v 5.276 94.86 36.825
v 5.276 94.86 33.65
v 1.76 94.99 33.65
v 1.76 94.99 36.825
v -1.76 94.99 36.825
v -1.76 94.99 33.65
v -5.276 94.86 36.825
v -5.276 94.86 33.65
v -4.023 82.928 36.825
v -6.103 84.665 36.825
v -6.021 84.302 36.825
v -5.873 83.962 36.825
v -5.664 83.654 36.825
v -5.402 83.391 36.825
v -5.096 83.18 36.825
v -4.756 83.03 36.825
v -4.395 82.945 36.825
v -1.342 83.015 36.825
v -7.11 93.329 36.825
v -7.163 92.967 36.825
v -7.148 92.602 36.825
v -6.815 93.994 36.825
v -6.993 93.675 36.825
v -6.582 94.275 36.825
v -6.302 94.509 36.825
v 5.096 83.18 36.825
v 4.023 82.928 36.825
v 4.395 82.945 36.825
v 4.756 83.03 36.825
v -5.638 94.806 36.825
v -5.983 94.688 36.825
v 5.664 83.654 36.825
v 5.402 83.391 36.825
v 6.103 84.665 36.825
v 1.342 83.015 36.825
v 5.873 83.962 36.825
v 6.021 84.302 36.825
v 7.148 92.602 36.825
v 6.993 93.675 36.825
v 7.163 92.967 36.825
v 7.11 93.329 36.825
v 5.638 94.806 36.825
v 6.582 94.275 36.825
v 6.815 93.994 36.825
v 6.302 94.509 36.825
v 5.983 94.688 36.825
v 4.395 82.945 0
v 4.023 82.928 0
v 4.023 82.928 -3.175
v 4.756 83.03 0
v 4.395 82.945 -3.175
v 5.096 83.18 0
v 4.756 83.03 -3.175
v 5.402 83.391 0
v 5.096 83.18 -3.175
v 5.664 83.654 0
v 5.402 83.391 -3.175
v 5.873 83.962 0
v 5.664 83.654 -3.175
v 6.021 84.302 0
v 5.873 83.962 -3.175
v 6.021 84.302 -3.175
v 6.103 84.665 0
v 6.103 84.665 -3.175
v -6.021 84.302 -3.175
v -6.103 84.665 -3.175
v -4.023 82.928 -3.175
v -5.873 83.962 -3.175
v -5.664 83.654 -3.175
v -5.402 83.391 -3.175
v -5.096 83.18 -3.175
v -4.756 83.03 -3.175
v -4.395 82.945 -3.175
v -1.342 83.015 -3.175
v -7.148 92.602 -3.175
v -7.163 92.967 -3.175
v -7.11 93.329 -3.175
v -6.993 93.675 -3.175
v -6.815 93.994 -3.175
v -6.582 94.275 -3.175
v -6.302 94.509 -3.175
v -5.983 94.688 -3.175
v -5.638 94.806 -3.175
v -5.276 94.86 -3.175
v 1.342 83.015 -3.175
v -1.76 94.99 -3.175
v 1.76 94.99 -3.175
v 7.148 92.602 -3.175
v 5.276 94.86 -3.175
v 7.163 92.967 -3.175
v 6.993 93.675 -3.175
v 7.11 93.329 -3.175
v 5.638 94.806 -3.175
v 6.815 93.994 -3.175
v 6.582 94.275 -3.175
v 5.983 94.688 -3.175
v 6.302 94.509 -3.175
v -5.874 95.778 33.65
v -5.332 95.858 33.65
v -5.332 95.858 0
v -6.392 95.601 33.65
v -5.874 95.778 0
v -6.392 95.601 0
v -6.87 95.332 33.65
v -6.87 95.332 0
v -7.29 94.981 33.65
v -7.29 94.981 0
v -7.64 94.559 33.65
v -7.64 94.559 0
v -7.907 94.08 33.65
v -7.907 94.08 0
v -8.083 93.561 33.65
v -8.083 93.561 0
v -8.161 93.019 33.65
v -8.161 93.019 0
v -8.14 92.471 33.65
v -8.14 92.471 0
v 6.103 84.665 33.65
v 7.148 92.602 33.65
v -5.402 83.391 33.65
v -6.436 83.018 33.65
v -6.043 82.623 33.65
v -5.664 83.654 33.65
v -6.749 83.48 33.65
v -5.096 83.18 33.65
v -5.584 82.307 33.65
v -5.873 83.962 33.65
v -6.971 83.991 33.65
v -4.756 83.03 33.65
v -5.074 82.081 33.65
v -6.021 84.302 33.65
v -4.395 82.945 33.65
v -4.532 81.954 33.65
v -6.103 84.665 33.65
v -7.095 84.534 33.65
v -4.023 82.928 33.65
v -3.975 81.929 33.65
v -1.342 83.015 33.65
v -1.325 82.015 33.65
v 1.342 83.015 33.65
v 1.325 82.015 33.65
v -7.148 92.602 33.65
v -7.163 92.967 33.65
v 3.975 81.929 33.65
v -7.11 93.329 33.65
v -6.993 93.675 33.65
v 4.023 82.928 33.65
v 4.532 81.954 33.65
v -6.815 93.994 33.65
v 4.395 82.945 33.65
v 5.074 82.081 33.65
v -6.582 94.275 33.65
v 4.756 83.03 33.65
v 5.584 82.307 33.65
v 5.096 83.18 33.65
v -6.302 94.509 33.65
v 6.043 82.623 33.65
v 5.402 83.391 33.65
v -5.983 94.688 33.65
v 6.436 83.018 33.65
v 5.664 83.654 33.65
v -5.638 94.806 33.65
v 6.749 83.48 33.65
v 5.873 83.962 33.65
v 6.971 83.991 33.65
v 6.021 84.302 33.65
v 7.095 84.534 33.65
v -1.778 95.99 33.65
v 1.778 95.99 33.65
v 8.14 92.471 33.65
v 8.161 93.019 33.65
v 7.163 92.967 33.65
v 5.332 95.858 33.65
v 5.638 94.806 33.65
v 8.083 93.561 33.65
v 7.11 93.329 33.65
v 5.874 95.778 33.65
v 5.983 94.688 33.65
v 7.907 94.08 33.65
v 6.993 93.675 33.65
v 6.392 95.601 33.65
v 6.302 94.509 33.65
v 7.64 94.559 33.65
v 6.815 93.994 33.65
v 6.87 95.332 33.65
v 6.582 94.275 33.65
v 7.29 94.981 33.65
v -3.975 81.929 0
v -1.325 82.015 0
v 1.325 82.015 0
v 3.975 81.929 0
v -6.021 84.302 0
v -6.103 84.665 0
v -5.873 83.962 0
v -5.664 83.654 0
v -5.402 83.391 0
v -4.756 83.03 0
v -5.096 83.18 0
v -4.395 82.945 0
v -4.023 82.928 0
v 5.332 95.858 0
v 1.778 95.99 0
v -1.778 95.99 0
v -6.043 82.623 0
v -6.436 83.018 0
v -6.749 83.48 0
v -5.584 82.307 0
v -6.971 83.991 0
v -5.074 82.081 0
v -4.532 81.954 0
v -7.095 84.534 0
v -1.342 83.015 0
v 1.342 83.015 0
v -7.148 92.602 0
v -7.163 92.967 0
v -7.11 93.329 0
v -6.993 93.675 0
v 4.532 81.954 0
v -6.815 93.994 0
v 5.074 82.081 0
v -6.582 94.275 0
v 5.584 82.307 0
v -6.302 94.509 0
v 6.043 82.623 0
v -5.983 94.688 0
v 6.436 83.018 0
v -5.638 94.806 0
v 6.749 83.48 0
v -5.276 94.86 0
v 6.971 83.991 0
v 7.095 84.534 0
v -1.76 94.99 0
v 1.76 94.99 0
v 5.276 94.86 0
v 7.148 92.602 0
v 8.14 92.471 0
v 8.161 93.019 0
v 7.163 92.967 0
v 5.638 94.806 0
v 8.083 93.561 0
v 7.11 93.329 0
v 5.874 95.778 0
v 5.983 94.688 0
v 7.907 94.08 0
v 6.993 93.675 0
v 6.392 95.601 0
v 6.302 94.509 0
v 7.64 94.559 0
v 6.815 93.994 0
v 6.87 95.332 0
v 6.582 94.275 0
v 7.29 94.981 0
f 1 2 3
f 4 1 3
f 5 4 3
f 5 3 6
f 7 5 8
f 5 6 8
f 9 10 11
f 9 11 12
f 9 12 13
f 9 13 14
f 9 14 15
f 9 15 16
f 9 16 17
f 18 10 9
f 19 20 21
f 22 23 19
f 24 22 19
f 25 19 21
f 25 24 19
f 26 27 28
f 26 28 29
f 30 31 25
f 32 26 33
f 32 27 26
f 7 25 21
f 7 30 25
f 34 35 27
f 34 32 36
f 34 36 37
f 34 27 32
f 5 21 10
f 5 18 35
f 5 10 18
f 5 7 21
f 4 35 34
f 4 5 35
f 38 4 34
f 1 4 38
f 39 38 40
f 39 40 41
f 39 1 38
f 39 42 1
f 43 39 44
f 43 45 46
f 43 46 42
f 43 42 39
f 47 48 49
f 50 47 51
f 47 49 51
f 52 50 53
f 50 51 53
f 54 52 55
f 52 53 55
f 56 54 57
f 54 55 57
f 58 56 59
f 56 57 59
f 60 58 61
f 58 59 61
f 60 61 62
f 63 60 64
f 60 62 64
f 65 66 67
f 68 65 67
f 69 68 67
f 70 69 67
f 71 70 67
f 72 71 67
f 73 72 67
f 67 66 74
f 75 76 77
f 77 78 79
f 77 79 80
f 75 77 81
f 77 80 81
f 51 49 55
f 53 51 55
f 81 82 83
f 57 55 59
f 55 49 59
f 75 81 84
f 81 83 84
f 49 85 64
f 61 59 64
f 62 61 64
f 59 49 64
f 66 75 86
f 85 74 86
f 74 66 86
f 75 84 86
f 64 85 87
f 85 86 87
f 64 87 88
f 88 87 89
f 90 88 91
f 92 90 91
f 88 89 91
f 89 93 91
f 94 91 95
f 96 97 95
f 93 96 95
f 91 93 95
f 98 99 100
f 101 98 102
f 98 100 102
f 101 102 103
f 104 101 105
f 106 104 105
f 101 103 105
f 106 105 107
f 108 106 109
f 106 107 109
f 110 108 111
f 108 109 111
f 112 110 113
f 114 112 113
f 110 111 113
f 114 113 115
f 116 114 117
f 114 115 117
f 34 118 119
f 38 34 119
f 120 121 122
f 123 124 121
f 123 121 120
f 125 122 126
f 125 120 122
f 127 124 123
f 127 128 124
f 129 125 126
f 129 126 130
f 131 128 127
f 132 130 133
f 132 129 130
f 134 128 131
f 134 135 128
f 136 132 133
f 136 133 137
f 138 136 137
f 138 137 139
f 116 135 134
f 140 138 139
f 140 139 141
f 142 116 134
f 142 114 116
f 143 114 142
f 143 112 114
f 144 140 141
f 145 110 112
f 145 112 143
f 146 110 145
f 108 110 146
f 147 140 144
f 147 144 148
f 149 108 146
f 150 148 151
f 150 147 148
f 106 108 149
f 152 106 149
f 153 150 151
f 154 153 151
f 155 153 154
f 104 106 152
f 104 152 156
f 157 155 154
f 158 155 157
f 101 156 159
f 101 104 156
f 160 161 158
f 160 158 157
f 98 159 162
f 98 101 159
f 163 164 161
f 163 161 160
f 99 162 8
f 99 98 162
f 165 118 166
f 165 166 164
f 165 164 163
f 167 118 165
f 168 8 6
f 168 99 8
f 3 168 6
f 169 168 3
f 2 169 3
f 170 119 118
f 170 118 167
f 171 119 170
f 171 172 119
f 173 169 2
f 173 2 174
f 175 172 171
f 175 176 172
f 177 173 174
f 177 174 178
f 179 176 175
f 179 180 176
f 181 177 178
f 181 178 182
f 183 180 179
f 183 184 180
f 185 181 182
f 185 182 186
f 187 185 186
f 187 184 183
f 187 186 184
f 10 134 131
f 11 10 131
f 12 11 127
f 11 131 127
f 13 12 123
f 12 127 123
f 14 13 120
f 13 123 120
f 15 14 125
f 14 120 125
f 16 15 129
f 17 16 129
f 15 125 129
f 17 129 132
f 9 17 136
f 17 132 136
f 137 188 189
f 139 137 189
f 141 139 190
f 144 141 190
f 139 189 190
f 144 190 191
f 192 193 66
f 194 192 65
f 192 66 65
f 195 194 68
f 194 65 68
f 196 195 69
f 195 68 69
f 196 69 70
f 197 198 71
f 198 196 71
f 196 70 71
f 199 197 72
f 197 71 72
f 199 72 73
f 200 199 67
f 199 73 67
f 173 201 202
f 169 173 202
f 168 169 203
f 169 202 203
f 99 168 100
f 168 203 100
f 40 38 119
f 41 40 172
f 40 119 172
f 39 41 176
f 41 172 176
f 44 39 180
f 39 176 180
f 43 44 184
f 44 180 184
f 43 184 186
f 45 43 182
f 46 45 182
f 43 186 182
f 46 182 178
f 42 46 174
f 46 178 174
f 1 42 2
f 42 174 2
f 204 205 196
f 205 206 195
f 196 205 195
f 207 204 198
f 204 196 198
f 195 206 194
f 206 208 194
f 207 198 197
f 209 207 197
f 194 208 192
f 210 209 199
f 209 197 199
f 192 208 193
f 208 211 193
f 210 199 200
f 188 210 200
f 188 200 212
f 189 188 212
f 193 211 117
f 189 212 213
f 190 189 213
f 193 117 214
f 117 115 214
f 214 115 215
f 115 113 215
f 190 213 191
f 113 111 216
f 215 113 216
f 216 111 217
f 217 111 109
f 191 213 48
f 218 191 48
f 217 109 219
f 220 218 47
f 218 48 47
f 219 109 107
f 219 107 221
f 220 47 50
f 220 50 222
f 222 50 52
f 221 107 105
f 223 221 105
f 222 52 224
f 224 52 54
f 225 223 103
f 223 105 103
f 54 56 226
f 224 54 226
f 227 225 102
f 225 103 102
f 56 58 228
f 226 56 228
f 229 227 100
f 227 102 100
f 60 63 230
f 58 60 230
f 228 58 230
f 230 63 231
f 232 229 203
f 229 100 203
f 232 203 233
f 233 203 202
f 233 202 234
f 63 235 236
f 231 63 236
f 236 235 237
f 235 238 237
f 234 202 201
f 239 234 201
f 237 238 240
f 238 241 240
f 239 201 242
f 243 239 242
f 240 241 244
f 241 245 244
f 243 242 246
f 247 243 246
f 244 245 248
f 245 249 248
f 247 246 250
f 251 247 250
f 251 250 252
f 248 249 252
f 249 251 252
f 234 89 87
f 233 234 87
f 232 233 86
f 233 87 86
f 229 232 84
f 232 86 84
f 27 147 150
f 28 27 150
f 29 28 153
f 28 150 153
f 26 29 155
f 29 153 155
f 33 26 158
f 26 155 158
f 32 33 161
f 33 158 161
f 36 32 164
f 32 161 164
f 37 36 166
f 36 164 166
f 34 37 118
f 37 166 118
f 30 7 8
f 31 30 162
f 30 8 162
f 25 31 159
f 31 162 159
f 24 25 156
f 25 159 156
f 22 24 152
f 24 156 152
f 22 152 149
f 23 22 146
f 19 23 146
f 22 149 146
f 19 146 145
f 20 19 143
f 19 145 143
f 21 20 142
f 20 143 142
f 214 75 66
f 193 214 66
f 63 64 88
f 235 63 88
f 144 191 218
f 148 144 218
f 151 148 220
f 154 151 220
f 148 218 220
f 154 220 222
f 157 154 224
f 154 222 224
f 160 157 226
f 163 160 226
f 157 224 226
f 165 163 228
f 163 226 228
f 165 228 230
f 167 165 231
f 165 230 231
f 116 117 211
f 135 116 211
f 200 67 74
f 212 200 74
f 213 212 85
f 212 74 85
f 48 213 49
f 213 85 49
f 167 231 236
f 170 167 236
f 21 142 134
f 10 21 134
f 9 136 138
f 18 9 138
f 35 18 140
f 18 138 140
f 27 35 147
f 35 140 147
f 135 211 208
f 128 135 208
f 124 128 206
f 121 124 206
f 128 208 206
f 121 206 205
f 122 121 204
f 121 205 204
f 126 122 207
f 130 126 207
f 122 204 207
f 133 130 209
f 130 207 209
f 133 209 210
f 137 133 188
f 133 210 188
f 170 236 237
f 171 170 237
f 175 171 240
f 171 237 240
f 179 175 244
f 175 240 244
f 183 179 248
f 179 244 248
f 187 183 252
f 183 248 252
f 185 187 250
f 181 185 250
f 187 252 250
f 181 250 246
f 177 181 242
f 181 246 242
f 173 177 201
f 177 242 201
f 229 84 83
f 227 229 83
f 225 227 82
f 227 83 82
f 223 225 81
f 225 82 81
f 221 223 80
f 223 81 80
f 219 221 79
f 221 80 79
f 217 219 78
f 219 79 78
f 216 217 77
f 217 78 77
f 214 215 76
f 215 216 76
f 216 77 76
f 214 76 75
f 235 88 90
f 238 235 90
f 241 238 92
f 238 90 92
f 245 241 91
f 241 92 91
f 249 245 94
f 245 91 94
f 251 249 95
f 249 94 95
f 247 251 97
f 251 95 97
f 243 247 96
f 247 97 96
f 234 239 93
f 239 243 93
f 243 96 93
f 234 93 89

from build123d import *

# Parameters (mm, degrees)
BOSS_EXTRUDE1_DEPTH      = 36.825
BOSS_EXTRUDE1_DEPTH_BACK = 3.175
BOSS_EXTRUDE2_DEPTH      = 33.65


with BuildPart() as part:
    # Sketch1 → Boss-Extrude1 (new, two sides: drawn at the far end of the back side and taken through both)
    with BuildSketch(Plane.XY.offset(-BOSS_EXTRUDE1_DEPTH_BACK)):
        with BuildLine():
            Line((6.103170523, 84.664670477), (7.148138473, 92.601990083))
            ThreePointArc((7.148138473, 92.601990083), (6.704979898, 94.139454624), (5.276321506, 94.859955796))
            ThreePointArc((5.276321506, 94.859955796), (0, 95.006582836), (-5.276321506, 94.859955796))
            ThreePointArc((-5.276321506, 94.859955796), (-6.704979898, 94.139454624), (-7.148138473, 92.601990083))
            Line((-7.148138473, 92.601990083), (-6.103170523, 84.664670477))
            ThreePointArc((-6.103170523, 84.664670477), (-5.402140732, 83.39052414), (-4.023362223, 82.928072545))
            ThreePointArc((-4.023362223, 82.928072545), (0, 83.025614479), (4.023362223, 82.928072545))
            ThreePointArc((4.023362223, 82.928072545), (5.402140732, 83.39052414), (6.103170523, 84.664670477))
        make_face()
    extrude(amount=BOSS_EXTRUDE1_DEPTH + BOSS_EXTRUDE1_DEPTH_BACK)

    # Sketch2 → Boss-Extrude2 (add)
    with BuildSketch(Plane.XY):
        with BuildLine():
            Line((7.094615384, 84.534144285), (8.139583334, 92.47146389))
            ThreePointArc((8.139583334, 92.47146389), (7.474845471, 94.777660702), (5.331857885, 95.85841246))
            ThreePointArc((5.331857885, 95.85841246), (0, 96.006582836), (-5.331857885, 95.85841246))
            ThreePointArc((-5.331857885, 95.85841246), (-7.474845471, 94.777660702), (-8.139583334, 92.47146389))
            Line((-8.139583334, 92.47146389), (-7.094615384, 84.534144285))
            ThreePointArc((-7.094615384, 84.534144285), (-6.043070698, 82.622924779), (-3.974902934, 81.929247386))
            ThreePointArc((-3.974902934, 81.929247386), (0, 82.025614479), (3.974902934, 81.929247386))
            ThreePointArc((3.974902934, 81.929247386), (6.043070698, 82.622924779), (7.094615384, 84.534144285))
        make_face()
    extrude(amount=BOSS_EXTRUDE2_DEPTH)


solid = part.part
